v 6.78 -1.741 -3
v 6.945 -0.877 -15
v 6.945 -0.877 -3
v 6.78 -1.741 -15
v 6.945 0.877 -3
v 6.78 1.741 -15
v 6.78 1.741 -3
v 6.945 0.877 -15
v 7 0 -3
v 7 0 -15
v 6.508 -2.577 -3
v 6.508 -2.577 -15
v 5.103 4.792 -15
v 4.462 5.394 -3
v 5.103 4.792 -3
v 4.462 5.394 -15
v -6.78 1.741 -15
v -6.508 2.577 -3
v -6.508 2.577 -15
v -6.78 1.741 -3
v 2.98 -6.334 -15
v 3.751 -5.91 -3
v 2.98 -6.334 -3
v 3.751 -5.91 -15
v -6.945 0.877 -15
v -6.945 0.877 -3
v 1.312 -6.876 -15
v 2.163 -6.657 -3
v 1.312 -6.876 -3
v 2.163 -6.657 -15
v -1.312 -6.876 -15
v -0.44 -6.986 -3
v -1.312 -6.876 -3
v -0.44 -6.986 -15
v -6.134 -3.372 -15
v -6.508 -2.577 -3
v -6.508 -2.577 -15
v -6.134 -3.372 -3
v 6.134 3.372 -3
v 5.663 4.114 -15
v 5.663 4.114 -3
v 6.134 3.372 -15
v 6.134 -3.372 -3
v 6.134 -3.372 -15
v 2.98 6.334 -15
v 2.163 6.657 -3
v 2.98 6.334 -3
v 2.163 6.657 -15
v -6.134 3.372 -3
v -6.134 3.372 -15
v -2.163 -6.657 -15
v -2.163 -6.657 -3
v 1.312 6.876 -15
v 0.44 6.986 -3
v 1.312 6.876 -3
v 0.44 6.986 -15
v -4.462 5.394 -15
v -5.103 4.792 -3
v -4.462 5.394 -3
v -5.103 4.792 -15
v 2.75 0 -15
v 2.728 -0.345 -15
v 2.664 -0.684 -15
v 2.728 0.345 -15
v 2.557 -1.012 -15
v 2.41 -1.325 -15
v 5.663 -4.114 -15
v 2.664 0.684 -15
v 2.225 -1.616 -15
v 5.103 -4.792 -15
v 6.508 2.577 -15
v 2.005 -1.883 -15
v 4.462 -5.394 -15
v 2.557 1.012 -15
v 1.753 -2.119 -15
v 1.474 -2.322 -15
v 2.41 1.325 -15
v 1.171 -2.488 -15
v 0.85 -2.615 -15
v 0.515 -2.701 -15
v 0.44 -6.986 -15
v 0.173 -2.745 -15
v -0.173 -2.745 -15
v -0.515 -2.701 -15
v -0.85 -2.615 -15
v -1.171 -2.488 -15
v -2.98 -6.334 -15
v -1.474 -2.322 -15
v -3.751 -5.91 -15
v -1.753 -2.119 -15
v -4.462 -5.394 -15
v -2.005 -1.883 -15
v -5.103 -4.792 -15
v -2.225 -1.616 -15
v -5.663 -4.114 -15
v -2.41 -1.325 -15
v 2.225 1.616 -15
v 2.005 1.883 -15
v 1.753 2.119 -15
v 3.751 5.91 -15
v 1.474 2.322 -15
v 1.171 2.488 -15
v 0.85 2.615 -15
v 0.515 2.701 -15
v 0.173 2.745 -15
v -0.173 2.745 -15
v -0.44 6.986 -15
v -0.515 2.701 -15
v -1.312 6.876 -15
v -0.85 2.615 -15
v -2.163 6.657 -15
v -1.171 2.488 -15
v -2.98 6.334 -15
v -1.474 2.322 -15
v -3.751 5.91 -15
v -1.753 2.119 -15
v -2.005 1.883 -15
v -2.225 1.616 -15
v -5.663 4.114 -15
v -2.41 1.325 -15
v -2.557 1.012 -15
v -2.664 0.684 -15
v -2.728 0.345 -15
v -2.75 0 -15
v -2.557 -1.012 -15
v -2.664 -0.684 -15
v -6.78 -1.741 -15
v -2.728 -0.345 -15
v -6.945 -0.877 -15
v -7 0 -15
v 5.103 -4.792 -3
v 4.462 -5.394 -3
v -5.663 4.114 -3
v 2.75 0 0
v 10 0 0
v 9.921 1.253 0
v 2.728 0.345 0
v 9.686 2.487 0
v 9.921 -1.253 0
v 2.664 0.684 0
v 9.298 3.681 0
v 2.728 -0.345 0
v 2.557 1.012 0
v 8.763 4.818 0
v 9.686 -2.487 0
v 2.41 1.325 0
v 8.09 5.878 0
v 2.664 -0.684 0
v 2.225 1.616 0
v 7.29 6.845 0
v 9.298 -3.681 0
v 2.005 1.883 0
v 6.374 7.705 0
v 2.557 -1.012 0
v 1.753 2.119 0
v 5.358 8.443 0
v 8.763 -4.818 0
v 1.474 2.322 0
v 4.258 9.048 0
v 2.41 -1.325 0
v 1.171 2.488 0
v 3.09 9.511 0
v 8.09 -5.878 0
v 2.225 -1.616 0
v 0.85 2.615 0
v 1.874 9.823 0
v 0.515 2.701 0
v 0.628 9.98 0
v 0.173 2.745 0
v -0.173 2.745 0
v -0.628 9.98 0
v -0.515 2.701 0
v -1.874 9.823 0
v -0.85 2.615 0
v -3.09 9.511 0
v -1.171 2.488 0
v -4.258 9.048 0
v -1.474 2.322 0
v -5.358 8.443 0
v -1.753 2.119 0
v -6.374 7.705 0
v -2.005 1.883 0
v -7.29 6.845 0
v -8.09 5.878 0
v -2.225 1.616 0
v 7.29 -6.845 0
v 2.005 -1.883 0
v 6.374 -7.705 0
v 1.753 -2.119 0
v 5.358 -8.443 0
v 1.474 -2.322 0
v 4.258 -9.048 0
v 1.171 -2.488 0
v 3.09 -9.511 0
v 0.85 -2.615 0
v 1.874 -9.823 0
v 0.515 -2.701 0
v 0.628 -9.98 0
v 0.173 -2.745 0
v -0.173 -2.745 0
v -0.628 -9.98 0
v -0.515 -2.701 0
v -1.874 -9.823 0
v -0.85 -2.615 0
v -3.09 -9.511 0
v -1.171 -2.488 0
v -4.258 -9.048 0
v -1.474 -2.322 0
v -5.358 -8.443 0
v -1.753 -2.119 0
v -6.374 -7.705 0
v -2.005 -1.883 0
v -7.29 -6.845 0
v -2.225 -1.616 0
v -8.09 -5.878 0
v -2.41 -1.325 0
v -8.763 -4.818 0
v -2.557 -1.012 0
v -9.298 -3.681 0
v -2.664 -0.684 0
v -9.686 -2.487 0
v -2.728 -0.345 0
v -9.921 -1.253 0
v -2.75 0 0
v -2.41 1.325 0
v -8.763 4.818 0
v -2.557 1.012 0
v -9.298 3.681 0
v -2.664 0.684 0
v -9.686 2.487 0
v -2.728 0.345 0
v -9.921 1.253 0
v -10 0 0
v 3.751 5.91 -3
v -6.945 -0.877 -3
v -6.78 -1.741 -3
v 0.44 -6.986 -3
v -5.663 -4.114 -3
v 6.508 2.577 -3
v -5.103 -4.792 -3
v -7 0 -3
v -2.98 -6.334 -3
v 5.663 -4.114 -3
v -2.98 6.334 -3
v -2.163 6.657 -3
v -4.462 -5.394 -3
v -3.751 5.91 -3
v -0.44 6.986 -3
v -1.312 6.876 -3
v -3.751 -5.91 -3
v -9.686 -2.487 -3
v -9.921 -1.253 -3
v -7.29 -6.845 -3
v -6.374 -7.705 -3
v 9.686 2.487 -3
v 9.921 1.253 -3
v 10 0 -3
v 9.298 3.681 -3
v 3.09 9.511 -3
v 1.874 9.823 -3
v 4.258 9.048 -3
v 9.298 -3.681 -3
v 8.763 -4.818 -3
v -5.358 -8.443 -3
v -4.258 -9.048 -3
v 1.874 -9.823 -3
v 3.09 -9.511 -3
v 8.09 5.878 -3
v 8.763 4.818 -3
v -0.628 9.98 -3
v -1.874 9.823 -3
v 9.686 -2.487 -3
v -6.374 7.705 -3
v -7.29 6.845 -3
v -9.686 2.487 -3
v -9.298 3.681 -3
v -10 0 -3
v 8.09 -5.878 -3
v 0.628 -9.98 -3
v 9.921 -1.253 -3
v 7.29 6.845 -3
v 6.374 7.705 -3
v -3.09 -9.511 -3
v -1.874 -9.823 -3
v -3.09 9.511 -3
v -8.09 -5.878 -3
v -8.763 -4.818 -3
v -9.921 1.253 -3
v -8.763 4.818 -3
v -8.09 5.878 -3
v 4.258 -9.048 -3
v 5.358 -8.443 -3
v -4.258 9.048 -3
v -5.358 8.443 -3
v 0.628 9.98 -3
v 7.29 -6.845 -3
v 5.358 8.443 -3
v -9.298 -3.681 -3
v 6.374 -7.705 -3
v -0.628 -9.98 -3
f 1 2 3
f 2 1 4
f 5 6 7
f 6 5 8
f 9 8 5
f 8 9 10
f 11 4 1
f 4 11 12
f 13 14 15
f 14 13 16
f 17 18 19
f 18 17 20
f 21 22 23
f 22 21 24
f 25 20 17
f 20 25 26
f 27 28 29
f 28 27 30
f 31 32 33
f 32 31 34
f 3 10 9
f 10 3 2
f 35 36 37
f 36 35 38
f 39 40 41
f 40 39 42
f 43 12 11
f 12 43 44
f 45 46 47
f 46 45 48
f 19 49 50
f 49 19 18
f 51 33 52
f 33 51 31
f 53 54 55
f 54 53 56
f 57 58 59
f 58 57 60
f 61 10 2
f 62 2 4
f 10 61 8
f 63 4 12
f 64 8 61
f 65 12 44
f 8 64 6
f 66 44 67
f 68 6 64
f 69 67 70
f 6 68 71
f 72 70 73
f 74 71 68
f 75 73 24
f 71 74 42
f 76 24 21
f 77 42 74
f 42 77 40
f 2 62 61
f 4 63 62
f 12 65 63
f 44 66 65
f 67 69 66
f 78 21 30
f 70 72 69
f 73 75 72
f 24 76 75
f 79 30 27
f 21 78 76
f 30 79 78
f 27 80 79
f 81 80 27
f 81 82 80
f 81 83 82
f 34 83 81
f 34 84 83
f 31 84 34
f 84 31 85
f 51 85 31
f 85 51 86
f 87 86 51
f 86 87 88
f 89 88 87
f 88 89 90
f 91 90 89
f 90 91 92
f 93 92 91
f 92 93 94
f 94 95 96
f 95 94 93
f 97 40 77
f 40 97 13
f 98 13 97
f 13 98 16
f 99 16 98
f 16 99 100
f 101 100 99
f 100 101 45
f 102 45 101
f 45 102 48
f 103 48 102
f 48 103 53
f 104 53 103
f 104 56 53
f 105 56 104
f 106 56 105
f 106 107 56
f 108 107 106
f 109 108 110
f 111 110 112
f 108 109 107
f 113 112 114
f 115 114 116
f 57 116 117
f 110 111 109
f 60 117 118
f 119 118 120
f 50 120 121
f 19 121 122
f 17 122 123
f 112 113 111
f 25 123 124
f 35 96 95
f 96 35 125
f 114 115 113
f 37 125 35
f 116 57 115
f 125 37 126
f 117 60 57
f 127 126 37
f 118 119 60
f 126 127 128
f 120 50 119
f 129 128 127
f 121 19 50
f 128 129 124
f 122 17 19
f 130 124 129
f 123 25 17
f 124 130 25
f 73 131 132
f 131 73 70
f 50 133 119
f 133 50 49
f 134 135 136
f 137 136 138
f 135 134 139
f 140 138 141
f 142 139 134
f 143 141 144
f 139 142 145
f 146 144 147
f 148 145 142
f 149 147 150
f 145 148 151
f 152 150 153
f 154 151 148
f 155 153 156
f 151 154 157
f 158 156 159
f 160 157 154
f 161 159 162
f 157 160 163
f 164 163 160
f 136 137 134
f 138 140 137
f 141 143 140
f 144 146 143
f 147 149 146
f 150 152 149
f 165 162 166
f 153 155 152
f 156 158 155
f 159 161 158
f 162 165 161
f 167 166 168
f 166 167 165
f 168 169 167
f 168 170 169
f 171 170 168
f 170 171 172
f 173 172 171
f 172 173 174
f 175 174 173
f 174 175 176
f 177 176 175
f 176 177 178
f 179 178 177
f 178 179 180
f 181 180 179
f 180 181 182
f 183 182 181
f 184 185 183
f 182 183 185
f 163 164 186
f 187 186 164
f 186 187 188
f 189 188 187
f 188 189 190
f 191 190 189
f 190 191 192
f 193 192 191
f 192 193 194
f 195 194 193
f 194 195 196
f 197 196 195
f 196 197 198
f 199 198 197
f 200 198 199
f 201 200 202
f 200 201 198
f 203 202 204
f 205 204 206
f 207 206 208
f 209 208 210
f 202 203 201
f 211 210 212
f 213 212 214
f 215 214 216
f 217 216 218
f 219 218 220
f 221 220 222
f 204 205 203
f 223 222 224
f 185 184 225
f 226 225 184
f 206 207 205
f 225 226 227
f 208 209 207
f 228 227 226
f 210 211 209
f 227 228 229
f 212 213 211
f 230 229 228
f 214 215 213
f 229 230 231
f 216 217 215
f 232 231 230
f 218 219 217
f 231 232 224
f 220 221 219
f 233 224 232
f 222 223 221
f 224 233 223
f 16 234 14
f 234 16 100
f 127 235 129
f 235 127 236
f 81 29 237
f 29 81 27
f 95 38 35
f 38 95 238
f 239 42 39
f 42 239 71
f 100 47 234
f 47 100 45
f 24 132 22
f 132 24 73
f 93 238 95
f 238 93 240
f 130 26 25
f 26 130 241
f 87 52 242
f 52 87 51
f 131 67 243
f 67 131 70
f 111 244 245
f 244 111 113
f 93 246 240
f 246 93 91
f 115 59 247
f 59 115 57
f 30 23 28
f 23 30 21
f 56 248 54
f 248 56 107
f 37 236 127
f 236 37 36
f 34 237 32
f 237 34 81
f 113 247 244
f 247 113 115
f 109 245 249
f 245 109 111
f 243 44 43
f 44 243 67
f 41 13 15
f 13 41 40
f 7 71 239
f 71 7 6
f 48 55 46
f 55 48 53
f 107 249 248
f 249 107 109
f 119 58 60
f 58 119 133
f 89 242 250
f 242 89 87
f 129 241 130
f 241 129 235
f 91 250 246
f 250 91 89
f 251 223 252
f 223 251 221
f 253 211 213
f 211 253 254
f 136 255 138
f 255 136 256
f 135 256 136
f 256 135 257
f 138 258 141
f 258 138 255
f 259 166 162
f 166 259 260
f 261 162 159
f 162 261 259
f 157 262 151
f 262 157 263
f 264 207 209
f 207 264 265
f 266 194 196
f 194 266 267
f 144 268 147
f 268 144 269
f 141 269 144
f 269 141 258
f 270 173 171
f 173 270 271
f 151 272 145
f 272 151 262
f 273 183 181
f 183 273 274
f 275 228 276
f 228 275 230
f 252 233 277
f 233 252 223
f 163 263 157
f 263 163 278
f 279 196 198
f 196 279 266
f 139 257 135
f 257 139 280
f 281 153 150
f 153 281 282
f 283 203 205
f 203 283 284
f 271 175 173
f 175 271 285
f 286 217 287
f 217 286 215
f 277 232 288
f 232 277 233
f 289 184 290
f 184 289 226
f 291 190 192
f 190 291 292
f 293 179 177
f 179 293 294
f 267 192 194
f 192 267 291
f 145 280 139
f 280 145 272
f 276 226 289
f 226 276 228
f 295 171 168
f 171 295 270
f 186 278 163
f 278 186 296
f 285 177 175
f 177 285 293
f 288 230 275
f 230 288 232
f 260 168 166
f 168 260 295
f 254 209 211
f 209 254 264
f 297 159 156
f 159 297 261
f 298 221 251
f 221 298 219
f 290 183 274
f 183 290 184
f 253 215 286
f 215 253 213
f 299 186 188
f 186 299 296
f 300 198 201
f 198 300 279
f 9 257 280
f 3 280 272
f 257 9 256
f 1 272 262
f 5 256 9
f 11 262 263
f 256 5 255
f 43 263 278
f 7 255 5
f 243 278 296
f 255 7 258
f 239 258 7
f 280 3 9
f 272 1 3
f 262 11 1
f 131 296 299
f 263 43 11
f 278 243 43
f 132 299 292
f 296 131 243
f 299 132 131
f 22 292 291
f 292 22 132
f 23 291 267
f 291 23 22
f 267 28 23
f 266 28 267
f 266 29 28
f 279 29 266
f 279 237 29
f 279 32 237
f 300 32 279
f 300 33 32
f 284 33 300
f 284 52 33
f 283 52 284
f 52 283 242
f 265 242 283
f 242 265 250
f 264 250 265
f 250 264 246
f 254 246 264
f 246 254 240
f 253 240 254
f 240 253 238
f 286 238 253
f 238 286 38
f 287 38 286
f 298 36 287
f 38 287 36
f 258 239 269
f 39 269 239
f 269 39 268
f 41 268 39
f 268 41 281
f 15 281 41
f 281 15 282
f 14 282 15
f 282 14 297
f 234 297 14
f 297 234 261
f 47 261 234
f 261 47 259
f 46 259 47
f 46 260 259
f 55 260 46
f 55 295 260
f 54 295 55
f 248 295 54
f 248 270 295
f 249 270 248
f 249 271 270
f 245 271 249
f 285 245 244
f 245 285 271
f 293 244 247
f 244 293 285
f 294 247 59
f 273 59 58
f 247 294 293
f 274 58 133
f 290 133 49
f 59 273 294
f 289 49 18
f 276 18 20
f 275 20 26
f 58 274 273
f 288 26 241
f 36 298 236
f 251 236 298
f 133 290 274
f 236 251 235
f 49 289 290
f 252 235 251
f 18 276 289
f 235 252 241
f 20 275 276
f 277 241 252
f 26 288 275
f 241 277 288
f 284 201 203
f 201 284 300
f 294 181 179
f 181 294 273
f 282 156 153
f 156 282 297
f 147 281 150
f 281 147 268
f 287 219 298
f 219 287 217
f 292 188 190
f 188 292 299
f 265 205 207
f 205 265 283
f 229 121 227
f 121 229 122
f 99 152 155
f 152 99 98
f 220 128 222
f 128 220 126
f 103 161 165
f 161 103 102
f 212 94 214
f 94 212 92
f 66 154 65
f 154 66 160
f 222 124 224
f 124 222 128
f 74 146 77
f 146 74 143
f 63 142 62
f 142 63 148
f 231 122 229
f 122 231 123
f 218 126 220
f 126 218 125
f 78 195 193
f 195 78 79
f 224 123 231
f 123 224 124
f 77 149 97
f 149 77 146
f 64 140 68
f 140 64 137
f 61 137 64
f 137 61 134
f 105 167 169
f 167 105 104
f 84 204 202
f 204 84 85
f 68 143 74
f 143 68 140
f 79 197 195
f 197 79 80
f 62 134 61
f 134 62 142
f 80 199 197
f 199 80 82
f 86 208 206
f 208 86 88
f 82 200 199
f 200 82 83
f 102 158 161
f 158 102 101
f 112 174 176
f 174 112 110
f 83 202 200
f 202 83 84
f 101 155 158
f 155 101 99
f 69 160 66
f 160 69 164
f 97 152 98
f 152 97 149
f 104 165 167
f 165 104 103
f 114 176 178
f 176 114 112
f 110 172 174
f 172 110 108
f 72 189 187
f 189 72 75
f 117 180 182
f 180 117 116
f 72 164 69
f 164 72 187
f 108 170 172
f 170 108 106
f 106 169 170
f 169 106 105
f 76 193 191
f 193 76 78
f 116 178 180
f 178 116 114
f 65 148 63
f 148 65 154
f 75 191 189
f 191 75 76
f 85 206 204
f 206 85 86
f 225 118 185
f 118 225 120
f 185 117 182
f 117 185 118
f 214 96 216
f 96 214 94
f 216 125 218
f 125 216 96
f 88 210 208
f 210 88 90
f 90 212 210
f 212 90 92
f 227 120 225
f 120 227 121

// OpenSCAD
$fn = 50;


difference() {
	union() {
		translate(v = [0, 0, -15.0000000000]) {
			cylinder(h = 15, r = 7.0000000000);
		}
		translate(v = [0, 0, -3.0000000000]) {
			cylinder(h = 3, r = 10.0000000000);
		}
	}
	union() {
		#translate(v = [0, 0, -15]) {
			cylinder(h = 15, r = 2.7500000000);
		}
	}
}
